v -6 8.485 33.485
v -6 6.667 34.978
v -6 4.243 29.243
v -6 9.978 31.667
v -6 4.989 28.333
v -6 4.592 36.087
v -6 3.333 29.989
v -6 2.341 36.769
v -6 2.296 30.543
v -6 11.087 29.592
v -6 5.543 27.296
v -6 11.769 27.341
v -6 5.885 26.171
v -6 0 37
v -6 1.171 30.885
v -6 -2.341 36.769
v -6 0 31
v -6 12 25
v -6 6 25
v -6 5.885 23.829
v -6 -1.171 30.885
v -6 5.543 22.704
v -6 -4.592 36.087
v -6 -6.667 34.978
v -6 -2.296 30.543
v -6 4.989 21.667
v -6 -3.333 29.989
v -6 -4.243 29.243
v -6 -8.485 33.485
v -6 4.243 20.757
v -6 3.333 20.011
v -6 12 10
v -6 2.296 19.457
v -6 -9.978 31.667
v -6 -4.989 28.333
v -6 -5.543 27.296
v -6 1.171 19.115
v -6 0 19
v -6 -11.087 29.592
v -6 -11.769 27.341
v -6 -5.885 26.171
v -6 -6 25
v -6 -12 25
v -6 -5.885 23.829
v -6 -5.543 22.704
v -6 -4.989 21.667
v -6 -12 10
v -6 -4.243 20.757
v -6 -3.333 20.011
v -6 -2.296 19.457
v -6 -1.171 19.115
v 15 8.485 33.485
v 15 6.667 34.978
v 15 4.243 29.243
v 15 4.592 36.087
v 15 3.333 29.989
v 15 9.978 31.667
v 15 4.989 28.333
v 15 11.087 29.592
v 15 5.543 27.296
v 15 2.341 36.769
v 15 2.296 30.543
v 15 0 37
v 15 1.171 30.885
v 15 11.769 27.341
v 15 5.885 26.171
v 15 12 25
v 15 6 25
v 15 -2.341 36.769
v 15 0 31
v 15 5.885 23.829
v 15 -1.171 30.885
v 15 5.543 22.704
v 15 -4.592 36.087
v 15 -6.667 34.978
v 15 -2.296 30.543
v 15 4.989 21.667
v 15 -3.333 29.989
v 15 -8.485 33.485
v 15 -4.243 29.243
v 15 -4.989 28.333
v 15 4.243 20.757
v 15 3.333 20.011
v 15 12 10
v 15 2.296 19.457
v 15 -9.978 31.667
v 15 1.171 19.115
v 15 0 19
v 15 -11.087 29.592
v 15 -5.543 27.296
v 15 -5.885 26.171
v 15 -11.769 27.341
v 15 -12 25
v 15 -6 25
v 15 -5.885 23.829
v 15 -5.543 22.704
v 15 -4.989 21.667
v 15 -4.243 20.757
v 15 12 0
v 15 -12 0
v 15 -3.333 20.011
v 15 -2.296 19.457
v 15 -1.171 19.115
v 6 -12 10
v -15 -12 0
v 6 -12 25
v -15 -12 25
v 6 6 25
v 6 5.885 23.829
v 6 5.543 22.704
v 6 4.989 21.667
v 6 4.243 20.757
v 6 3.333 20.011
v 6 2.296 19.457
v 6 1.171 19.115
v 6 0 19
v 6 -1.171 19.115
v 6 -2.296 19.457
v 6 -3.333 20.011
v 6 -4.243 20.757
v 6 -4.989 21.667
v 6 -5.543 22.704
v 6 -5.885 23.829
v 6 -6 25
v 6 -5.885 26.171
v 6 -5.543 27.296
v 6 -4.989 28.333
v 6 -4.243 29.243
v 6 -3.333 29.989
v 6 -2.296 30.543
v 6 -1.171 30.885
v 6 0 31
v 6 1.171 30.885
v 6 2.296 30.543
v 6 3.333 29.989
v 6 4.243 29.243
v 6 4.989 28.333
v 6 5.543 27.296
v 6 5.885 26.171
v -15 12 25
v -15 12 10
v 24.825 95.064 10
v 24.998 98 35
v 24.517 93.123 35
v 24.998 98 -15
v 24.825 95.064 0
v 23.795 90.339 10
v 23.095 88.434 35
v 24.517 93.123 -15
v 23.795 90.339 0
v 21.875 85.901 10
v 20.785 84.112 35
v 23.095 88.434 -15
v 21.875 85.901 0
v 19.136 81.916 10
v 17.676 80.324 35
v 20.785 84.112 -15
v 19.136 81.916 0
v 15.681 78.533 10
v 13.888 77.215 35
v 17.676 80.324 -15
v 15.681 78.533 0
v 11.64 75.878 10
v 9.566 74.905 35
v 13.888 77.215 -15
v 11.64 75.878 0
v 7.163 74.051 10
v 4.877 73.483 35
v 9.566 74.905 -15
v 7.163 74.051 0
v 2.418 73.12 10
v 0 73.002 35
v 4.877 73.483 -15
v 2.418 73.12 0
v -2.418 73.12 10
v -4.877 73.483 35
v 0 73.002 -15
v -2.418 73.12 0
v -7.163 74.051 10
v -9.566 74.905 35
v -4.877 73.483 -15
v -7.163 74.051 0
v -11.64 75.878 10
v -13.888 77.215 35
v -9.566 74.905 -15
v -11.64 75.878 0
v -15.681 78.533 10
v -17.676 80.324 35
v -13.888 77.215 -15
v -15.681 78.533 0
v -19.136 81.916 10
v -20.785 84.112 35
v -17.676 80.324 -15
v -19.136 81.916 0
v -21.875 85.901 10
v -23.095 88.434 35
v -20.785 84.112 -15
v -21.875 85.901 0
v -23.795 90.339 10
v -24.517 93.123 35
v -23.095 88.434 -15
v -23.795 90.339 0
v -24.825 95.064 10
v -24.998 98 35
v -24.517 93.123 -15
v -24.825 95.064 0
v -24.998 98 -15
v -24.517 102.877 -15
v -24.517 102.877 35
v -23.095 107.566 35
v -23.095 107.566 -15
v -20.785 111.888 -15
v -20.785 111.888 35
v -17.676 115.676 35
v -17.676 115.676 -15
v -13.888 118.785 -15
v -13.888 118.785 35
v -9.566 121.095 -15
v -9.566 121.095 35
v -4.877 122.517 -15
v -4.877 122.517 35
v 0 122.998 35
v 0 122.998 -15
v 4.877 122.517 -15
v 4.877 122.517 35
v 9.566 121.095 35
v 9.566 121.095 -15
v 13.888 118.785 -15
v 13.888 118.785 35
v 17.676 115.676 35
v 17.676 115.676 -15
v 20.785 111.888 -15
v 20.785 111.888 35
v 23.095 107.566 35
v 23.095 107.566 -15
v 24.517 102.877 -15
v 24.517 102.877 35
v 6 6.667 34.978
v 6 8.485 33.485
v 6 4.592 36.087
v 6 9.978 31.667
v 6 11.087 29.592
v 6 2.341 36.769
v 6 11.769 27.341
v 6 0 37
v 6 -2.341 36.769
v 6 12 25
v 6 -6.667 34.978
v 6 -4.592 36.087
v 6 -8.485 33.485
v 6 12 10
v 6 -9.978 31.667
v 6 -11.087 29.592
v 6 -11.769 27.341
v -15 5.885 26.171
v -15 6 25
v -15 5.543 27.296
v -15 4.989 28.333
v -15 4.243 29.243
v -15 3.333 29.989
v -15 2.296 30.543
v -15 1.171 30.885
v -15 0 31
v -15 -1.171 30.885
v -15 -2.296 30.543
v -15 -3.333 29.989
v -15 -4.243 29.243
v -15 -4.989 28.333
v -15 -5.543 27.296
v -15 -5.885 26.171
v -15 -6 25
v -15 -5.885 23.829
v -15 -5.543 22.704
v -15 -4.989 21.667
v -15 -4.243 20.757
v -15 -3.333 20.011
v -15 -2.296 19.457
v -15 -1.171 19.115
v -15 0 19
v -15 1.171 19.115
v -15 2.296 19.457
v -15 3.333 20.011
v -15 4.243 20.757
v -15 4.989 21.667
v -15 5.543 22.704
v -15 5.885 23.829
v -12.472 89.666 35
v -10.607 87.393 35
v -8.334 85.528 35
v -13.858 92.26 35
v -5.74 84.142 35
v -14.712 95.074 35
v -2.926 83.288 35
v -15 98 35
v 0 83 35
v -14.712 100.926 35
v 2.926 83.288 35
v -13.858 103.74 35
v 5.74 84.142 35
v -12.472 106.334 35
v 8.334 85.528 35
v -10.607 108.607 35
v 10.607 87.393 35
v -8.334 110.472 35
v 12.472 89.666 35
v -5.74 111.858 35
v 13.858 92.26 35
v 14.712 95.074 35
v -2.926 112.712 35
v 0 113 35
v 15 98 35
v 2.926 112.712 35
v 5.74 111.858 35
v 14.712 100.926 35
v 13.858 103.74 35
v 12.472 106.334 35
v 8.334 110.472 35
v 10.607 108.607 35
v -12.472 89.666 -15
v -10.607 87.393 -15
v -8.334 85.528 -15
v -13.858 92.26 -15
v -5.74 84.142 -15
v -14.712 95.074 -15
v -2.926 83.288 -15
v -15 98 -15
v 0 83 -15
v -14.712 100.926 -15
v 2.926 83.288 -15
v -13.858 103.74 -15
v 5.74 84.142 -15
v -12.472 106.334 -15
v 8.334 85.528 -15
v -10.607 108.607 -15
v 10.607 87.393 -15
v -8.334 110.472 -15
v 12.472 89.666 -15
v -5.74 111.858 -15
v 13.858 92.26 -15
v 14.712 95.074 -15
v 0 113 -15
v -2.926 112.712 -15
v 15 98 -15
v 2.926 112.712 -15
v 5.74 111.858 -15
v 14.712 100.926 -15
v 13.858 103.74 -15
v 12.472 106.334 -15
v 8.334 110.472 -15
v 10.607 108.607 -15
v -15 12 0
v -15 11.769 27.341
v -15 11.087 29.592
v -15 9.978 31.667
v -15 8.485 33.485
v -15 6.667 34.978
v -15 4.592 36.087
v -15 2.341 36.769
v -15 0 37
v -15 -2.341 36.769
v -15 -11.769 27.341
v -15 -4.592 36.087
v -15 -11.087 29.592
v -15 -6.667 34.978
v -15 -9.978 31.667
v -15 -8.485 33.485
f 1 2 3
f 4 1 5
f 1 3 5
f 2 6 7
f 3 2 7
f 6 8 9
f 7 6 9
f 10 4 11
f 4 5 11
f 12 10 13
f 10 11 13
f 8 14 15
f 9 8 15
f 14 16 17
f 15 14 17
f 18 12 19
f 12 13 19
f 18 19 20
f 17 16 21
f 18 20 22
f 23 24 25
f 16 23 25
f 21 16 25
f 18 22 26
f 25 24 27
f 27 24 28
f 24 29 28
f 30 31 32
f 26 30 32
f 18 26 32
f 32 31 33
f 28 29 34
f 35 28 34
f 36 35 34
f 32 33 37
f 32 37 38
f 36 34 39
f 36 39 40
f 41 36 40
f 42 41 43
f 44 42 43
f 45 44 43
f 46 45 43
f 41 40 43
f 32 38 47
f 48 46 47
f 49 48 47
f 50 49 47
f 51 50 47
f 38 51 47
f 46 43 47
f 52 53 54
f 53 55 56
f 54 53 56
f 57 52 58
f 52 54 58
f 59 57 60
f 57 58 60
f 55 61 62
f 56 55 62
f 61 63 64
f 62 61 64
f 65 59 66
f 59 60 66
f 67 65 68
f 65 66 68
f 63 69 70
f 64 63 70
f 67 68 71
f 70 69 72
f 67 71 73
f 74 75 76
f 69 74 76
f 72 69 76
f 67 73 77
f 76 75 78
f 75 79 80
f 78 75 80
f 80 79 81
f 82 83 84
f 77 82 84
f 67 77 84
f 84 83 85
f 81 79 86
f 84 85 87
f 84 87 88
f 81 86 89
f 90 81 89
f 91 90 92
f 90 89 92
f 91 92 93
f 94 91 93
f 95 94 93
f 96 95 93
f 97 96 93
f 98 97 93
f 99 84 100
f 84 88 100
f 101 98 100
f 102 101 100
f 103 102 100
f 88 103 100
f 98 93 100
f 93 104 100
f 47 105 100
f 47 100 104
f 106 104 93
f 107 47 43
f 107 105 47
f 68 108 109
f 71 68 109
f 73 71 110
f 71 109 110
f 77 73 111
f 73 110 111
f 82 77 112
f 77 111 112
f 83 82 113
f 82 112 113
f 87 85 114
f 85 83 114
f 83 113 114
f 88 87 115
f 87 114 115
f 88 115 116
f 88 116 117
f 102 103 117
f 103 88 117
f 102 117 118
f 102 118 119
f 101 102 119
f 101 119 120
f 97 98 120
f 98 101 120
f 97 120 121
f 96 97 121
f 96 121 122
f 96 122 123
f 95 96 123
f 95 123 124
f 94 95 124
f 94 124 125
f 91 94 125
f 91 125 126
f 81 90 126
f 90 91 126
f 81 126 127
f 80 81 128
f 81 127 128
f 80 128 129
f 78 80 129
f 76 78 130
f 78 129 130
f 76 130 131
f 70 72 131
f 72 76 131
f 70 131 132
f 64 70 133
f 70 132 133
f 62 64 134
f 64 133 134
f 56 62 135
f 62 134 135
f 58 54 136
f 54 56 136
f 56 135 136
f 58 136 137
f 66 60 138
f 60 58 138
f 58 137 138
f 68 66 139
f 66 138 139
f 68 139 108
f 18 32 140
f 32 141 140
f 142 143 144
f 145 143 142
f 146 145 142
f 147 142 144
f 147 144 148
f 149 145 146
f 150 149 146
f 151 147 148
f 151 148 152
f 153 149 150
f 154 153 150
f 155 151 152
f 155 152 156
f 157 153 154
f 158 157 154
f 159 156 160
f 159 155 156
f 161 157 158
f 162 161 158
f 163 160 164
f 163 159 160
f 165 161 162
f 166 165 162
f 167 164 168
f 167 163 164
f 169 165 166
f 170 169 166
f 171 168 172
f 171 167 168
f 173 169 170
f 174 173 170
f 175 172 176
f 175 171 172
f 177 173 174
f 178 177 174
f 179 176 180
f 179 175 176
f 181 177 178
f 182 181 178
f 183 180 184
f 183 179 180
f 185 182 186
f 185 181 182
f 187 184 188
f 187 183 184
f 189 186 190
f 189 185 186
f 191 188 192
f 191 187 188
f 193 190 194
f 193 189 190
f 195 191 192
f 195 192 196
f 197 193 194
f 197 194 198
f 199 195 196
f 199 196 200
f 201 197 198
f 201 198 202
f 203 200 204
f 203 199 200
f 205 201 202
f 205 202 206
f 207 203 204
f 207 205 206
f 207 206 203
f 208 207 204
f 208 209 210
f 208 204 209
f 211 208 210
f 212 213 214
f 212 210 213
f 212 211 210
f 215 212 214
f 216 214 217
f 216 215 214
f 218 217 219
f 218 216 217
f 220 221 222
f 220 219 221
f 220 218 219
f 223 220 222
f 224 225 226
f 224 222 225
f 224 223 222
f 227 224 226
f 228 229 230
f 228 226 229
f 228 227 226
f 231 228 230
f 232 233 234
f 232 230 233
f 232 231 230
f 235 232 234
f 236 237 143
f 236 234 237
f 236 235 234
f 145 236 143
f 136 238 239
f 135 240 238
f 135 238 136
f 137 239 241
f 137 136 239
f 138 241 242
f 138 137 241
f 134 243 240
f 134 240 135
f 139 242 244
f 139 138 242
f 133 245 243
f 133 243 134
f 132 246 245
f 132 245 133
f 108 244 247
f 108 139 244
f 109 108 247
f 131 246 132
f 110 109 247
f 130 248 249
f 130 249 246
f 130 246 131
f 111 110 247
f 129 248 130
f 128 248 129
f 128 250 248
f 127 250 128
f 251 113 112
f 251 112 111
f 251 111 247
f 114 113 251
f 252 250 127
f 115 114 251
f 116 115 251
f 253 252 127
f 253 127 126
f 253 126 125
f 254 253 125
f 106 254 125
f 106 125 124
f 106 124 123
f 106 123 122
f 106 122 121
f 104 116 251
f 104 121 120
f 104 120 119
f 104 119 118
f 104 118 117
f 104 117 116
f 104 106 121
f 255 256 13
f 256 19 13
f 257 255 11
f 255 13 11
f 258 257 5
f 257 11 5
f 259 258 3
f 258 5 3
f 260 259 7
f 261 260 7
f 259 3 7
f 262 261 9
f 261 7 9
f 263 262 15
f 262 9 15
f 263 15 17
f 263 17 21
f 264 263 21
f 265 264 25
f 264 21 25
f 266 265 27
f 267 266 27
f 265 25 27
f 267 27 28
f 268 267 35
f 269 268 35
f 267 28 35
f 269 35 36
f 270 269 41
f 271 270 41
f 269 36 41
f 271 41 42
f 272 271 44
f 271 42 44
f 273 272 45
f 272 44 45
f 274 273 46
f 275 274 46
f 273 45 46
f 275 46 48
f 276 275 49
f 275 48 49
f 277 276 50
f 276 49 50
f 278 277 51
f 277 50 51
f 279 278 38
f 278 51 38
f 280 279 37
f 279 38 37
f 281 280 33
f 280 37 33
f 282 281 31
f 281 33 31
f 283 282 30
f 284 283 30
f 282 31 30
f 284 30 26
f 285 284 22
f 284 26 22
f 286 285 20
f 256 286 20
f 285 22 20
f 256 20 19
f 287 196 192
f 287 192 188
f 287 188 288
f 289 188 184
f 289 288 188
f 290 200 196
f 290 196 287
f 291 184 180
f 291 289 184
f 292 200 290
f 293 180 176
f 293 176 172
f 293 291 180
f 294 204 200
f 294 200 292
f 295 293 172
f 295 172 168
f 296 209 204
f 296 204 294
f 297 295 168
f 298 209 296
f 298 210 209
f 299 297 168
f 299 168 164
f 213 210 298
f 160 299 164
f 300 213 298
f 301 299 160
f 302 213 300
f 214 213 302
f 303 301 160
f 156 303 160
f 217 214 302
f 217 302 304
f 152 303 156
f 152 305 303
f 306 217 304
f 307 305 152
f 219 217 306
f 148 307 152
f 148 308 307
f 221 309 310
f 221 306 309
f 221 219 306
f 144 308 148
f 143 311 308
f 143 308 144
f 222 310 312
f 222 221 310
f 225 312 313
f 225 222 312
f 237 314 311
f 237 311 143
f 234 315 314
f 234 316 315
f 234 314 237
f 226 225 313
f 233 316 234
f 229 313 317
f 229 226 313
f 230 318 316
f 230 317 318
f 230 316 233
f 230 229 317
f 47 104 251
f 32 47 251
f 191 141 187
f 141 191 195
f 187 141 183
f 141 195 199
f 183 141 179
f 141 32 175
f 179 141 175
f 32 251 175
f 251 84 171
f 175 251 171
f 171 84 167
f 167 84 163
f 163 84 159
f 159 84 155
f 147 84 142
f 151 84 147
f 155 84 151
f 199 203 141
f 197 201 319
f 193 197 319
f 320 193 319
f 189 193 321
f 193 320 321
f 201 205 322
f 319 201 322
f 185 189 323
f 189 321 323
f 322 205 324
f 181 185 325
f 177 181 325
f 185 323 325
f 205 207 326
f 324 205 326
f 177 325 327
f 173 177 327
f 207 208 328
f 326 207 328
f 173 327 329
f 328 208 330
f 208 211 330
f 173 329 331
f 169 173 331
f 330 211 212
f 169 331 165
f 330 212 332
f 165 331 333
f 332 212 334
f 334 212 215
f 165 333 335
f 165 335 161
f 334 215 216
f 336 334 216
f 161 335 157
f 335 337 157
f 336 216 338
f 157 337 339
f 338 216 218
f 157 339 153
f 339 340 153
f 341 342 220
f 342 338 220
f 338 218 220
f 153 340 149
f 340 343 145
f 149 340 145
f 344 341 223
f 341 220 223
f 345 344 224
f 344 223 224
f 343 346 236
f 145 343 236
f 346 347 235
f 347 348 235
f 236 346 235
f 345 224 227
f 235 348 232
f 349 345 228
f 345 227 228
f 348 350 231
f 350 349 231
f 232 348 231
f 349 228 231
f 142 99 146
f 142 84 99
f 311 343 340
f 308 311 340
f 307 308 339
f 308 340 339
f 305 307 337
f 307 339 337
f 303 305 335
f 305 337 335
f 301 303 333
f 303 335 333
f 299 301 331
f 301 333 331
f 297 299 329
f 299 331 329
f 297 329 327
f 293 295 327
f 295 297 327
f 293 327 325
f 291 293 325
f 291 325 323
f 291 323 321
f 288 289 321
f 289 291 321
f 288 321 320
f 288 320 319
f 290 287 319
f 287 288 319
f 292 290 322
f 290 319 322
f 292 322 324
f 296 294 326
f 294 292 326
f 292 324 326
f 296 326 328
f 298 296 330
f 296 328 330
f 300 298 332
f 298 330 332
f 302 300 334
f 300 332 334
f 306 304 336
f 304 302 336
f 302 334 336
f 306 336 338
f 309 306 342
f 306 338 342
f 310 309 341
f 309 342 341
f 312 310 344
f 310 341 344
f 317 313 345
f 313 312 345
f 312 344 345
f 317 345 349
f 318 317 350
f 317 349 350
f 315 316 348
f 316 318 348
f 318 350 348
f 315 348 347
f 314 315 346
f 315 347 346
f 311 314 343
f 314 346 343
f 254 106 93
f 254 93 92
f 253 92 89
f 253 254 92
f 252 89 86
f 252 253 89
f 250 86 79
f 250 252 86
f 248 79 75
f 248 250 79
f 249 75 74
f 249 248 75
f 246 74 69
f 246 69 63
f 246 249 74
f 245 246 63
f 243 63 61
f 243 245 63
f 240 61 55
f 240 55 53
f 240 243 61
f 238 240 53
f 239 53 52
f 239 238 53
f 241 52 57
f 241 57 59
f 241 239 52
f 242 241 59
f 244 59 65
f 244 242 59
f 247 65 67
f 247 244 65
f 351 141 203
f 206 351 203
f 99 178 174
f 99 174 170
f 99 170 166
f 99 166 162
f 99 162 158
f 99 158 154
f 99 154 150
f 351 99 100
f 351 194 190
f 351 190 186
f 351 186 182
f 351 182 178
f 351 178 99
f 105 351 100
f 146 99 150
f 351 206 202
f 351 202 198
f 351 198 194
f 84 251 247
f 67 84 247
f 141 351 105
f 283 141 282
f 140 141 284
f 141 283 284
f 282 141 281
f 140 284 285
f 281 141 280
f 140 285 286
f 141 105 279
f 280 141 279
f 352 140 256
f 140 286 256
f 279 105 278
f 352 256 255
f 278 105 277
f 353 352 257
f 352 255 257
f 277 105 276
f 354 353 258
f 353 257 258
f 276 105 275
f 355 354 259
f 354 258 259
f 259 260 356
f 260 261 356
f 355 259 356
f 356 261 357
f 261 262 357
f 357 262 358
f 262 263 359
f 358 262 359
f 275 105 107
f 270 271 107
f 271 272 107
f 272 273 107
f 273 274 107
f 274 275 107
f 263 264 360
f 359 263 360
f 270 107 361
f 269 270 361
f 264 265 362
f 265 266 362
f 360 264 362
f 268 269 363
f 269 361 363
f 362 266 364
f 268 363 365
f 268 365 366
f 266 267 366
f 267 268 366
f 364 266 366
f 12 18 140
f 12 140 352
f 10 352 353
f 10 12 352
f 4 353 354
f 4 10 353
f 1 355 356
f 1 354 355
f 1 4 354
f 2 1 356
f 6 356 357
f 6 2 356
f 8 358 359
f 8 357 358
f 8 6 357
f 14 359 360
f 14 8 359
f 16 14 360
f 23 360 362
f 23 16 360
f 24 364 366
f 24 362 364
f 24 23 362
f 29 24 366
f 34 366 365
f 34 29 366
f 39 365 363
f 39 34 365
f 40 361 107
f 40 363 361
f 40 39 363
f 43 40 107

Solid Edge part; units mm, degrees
sketch "Sketch1" plane through (0, 0, 0) normal (1, 0, 0) x (0, 1, 0)
  line L0 (-12, 0) -> (-12, 25)
  line L1 (12, 0) -> (12, 25)
  line L2 (0, 0) -> (12, 0)
  line L3 (0, 0) -> (-12, 0)
  arc A0 (-12, 25) -> (12, 25) centre (0, 25) cw
  circle A1 centre (0, 25) radius 6
extrude "Protrusion1" add sketch "Sketch1" along normal blind 15
sketch "Sketch2" plane through (0, 0, 0) normal (1, 0, 0) x (0, 1, 0)
  line L0 (-12, 0) -> (-12, 25)
  line L1 (12, 0) -> (12, 25)
  line L2 (0, 0) -> (12, 0)
  line L3 (0, 0) -> (-12, 0)
  arc A0 (-12, 25) -> (12, 25) centre (0, 25) cw
  circle A1 centre (0, 25) radius 6
extrude "ExtrudedCutout_1" cut sketch "Sketch2" along normal blind 6
sketch "Sketch3" plane through (6, 0, 18.5) normal (-1, 0, 0) x (0, 0, 1)
  line L0 (-8.5, -12) -> (-8.5, 12)
  line L1 (-8.5, 12) -> (-18.5, 12)
  line L2 (-18.5, 12) -> (-18.5, -12)
  line L3 (-18.5, -12) -> (-8.5, -12)
extrude "ExtrudedProtrusion_4" add sketch "Sketch3" along normal blind 6
mirror "Mirror1" about plane through (0, 0, 0) normal (1, 0, 0) of "Protrusion1"
sketch "Sketch4" plane through (6, 0, 18.5) normal (-1, 0, 0) x (0, 0, 1)
  line L0 (-8.5, -12) -> (-8.5, 12)
  line L1 (-8.5, 12) -> (-18.5, 12)
  line L2 (-18.5, 12) -> (-18.5, -12)
  line L3 (-18.5, -12) -> (-8.5, -12)
extrude "ExtrudedCutout_2" cut sketch "Sketch4" along normal blind 12
sketch "Sketch5" plane through (0, 0, 0) normal (1, 0, 0) x (0, 1, 0)
  circle A0 centre (0, 25) radius 6
  line L0 (12, 25) -> (12, 10)
  line L1 (-12, 10) -> (12, 10)
  line L2 (-12, 25) -> (-12, 10)
  arc A1 (-12, 25) -> (12, 25) centre (0, 25) cw
extrude "ExtrudedCutout_3" cut sketch "Sketch5" against normal blind 6
sketch "Sketch6" plane through (6, 0, 18.5) normal (-1, 0, 0) x (0, 0, 1)
  line L0 (-8.5, -12) -> (-8.5, 12)
  line L1 (-8.5, 12) -> (-18.5, 12)
  line L2 (-18.5, 12) -> (-18.5, -12)
  line L3 (-18.5, -12) -> (-8.5, -12)
extrude "ExtrudedProtrusion_6" add sketch "Sketch6" along normal blind 12
sketch "Sketch7" plane through (0, 0, 10) normal (0, 0, 1) x (1, 0, 0)
  line L0 (-15, 12) -> (-24.8246, 95.0638)
  line L1 (0, 98) -> (-24.8246, 95.0638)
  line L2 (0, 98) -> (24.8246, 95.0638)
  line L3 (15, 12) -> (24.8246, 95.0638)
  line L4 (-15, 12) -> (15, 12)
extrude "ExtrudedProtrusion_9" add sketch "Sketch7" against normal blind 10
sketch "Sketch8" plane through (0, 0, 10) normal (0, 0, 1) x (1, 0, 0)
  circle A0 centre (0, 98) radius 24.9976
extrude "Cutout1" cut sketch "Sketch8" against normal blind 17.3955
sketch "Sketch9" plane through (0, 0, 10) normal (0, 0, 1) x (1, 0, 0)
  circle A0 centre (0, 98) radius 24.9976
  circle A1 centre (0, 98) radius 15
extrude "ExtrudedProtrusion_10" add sketch "Sketch9" along normal mid plane 50
